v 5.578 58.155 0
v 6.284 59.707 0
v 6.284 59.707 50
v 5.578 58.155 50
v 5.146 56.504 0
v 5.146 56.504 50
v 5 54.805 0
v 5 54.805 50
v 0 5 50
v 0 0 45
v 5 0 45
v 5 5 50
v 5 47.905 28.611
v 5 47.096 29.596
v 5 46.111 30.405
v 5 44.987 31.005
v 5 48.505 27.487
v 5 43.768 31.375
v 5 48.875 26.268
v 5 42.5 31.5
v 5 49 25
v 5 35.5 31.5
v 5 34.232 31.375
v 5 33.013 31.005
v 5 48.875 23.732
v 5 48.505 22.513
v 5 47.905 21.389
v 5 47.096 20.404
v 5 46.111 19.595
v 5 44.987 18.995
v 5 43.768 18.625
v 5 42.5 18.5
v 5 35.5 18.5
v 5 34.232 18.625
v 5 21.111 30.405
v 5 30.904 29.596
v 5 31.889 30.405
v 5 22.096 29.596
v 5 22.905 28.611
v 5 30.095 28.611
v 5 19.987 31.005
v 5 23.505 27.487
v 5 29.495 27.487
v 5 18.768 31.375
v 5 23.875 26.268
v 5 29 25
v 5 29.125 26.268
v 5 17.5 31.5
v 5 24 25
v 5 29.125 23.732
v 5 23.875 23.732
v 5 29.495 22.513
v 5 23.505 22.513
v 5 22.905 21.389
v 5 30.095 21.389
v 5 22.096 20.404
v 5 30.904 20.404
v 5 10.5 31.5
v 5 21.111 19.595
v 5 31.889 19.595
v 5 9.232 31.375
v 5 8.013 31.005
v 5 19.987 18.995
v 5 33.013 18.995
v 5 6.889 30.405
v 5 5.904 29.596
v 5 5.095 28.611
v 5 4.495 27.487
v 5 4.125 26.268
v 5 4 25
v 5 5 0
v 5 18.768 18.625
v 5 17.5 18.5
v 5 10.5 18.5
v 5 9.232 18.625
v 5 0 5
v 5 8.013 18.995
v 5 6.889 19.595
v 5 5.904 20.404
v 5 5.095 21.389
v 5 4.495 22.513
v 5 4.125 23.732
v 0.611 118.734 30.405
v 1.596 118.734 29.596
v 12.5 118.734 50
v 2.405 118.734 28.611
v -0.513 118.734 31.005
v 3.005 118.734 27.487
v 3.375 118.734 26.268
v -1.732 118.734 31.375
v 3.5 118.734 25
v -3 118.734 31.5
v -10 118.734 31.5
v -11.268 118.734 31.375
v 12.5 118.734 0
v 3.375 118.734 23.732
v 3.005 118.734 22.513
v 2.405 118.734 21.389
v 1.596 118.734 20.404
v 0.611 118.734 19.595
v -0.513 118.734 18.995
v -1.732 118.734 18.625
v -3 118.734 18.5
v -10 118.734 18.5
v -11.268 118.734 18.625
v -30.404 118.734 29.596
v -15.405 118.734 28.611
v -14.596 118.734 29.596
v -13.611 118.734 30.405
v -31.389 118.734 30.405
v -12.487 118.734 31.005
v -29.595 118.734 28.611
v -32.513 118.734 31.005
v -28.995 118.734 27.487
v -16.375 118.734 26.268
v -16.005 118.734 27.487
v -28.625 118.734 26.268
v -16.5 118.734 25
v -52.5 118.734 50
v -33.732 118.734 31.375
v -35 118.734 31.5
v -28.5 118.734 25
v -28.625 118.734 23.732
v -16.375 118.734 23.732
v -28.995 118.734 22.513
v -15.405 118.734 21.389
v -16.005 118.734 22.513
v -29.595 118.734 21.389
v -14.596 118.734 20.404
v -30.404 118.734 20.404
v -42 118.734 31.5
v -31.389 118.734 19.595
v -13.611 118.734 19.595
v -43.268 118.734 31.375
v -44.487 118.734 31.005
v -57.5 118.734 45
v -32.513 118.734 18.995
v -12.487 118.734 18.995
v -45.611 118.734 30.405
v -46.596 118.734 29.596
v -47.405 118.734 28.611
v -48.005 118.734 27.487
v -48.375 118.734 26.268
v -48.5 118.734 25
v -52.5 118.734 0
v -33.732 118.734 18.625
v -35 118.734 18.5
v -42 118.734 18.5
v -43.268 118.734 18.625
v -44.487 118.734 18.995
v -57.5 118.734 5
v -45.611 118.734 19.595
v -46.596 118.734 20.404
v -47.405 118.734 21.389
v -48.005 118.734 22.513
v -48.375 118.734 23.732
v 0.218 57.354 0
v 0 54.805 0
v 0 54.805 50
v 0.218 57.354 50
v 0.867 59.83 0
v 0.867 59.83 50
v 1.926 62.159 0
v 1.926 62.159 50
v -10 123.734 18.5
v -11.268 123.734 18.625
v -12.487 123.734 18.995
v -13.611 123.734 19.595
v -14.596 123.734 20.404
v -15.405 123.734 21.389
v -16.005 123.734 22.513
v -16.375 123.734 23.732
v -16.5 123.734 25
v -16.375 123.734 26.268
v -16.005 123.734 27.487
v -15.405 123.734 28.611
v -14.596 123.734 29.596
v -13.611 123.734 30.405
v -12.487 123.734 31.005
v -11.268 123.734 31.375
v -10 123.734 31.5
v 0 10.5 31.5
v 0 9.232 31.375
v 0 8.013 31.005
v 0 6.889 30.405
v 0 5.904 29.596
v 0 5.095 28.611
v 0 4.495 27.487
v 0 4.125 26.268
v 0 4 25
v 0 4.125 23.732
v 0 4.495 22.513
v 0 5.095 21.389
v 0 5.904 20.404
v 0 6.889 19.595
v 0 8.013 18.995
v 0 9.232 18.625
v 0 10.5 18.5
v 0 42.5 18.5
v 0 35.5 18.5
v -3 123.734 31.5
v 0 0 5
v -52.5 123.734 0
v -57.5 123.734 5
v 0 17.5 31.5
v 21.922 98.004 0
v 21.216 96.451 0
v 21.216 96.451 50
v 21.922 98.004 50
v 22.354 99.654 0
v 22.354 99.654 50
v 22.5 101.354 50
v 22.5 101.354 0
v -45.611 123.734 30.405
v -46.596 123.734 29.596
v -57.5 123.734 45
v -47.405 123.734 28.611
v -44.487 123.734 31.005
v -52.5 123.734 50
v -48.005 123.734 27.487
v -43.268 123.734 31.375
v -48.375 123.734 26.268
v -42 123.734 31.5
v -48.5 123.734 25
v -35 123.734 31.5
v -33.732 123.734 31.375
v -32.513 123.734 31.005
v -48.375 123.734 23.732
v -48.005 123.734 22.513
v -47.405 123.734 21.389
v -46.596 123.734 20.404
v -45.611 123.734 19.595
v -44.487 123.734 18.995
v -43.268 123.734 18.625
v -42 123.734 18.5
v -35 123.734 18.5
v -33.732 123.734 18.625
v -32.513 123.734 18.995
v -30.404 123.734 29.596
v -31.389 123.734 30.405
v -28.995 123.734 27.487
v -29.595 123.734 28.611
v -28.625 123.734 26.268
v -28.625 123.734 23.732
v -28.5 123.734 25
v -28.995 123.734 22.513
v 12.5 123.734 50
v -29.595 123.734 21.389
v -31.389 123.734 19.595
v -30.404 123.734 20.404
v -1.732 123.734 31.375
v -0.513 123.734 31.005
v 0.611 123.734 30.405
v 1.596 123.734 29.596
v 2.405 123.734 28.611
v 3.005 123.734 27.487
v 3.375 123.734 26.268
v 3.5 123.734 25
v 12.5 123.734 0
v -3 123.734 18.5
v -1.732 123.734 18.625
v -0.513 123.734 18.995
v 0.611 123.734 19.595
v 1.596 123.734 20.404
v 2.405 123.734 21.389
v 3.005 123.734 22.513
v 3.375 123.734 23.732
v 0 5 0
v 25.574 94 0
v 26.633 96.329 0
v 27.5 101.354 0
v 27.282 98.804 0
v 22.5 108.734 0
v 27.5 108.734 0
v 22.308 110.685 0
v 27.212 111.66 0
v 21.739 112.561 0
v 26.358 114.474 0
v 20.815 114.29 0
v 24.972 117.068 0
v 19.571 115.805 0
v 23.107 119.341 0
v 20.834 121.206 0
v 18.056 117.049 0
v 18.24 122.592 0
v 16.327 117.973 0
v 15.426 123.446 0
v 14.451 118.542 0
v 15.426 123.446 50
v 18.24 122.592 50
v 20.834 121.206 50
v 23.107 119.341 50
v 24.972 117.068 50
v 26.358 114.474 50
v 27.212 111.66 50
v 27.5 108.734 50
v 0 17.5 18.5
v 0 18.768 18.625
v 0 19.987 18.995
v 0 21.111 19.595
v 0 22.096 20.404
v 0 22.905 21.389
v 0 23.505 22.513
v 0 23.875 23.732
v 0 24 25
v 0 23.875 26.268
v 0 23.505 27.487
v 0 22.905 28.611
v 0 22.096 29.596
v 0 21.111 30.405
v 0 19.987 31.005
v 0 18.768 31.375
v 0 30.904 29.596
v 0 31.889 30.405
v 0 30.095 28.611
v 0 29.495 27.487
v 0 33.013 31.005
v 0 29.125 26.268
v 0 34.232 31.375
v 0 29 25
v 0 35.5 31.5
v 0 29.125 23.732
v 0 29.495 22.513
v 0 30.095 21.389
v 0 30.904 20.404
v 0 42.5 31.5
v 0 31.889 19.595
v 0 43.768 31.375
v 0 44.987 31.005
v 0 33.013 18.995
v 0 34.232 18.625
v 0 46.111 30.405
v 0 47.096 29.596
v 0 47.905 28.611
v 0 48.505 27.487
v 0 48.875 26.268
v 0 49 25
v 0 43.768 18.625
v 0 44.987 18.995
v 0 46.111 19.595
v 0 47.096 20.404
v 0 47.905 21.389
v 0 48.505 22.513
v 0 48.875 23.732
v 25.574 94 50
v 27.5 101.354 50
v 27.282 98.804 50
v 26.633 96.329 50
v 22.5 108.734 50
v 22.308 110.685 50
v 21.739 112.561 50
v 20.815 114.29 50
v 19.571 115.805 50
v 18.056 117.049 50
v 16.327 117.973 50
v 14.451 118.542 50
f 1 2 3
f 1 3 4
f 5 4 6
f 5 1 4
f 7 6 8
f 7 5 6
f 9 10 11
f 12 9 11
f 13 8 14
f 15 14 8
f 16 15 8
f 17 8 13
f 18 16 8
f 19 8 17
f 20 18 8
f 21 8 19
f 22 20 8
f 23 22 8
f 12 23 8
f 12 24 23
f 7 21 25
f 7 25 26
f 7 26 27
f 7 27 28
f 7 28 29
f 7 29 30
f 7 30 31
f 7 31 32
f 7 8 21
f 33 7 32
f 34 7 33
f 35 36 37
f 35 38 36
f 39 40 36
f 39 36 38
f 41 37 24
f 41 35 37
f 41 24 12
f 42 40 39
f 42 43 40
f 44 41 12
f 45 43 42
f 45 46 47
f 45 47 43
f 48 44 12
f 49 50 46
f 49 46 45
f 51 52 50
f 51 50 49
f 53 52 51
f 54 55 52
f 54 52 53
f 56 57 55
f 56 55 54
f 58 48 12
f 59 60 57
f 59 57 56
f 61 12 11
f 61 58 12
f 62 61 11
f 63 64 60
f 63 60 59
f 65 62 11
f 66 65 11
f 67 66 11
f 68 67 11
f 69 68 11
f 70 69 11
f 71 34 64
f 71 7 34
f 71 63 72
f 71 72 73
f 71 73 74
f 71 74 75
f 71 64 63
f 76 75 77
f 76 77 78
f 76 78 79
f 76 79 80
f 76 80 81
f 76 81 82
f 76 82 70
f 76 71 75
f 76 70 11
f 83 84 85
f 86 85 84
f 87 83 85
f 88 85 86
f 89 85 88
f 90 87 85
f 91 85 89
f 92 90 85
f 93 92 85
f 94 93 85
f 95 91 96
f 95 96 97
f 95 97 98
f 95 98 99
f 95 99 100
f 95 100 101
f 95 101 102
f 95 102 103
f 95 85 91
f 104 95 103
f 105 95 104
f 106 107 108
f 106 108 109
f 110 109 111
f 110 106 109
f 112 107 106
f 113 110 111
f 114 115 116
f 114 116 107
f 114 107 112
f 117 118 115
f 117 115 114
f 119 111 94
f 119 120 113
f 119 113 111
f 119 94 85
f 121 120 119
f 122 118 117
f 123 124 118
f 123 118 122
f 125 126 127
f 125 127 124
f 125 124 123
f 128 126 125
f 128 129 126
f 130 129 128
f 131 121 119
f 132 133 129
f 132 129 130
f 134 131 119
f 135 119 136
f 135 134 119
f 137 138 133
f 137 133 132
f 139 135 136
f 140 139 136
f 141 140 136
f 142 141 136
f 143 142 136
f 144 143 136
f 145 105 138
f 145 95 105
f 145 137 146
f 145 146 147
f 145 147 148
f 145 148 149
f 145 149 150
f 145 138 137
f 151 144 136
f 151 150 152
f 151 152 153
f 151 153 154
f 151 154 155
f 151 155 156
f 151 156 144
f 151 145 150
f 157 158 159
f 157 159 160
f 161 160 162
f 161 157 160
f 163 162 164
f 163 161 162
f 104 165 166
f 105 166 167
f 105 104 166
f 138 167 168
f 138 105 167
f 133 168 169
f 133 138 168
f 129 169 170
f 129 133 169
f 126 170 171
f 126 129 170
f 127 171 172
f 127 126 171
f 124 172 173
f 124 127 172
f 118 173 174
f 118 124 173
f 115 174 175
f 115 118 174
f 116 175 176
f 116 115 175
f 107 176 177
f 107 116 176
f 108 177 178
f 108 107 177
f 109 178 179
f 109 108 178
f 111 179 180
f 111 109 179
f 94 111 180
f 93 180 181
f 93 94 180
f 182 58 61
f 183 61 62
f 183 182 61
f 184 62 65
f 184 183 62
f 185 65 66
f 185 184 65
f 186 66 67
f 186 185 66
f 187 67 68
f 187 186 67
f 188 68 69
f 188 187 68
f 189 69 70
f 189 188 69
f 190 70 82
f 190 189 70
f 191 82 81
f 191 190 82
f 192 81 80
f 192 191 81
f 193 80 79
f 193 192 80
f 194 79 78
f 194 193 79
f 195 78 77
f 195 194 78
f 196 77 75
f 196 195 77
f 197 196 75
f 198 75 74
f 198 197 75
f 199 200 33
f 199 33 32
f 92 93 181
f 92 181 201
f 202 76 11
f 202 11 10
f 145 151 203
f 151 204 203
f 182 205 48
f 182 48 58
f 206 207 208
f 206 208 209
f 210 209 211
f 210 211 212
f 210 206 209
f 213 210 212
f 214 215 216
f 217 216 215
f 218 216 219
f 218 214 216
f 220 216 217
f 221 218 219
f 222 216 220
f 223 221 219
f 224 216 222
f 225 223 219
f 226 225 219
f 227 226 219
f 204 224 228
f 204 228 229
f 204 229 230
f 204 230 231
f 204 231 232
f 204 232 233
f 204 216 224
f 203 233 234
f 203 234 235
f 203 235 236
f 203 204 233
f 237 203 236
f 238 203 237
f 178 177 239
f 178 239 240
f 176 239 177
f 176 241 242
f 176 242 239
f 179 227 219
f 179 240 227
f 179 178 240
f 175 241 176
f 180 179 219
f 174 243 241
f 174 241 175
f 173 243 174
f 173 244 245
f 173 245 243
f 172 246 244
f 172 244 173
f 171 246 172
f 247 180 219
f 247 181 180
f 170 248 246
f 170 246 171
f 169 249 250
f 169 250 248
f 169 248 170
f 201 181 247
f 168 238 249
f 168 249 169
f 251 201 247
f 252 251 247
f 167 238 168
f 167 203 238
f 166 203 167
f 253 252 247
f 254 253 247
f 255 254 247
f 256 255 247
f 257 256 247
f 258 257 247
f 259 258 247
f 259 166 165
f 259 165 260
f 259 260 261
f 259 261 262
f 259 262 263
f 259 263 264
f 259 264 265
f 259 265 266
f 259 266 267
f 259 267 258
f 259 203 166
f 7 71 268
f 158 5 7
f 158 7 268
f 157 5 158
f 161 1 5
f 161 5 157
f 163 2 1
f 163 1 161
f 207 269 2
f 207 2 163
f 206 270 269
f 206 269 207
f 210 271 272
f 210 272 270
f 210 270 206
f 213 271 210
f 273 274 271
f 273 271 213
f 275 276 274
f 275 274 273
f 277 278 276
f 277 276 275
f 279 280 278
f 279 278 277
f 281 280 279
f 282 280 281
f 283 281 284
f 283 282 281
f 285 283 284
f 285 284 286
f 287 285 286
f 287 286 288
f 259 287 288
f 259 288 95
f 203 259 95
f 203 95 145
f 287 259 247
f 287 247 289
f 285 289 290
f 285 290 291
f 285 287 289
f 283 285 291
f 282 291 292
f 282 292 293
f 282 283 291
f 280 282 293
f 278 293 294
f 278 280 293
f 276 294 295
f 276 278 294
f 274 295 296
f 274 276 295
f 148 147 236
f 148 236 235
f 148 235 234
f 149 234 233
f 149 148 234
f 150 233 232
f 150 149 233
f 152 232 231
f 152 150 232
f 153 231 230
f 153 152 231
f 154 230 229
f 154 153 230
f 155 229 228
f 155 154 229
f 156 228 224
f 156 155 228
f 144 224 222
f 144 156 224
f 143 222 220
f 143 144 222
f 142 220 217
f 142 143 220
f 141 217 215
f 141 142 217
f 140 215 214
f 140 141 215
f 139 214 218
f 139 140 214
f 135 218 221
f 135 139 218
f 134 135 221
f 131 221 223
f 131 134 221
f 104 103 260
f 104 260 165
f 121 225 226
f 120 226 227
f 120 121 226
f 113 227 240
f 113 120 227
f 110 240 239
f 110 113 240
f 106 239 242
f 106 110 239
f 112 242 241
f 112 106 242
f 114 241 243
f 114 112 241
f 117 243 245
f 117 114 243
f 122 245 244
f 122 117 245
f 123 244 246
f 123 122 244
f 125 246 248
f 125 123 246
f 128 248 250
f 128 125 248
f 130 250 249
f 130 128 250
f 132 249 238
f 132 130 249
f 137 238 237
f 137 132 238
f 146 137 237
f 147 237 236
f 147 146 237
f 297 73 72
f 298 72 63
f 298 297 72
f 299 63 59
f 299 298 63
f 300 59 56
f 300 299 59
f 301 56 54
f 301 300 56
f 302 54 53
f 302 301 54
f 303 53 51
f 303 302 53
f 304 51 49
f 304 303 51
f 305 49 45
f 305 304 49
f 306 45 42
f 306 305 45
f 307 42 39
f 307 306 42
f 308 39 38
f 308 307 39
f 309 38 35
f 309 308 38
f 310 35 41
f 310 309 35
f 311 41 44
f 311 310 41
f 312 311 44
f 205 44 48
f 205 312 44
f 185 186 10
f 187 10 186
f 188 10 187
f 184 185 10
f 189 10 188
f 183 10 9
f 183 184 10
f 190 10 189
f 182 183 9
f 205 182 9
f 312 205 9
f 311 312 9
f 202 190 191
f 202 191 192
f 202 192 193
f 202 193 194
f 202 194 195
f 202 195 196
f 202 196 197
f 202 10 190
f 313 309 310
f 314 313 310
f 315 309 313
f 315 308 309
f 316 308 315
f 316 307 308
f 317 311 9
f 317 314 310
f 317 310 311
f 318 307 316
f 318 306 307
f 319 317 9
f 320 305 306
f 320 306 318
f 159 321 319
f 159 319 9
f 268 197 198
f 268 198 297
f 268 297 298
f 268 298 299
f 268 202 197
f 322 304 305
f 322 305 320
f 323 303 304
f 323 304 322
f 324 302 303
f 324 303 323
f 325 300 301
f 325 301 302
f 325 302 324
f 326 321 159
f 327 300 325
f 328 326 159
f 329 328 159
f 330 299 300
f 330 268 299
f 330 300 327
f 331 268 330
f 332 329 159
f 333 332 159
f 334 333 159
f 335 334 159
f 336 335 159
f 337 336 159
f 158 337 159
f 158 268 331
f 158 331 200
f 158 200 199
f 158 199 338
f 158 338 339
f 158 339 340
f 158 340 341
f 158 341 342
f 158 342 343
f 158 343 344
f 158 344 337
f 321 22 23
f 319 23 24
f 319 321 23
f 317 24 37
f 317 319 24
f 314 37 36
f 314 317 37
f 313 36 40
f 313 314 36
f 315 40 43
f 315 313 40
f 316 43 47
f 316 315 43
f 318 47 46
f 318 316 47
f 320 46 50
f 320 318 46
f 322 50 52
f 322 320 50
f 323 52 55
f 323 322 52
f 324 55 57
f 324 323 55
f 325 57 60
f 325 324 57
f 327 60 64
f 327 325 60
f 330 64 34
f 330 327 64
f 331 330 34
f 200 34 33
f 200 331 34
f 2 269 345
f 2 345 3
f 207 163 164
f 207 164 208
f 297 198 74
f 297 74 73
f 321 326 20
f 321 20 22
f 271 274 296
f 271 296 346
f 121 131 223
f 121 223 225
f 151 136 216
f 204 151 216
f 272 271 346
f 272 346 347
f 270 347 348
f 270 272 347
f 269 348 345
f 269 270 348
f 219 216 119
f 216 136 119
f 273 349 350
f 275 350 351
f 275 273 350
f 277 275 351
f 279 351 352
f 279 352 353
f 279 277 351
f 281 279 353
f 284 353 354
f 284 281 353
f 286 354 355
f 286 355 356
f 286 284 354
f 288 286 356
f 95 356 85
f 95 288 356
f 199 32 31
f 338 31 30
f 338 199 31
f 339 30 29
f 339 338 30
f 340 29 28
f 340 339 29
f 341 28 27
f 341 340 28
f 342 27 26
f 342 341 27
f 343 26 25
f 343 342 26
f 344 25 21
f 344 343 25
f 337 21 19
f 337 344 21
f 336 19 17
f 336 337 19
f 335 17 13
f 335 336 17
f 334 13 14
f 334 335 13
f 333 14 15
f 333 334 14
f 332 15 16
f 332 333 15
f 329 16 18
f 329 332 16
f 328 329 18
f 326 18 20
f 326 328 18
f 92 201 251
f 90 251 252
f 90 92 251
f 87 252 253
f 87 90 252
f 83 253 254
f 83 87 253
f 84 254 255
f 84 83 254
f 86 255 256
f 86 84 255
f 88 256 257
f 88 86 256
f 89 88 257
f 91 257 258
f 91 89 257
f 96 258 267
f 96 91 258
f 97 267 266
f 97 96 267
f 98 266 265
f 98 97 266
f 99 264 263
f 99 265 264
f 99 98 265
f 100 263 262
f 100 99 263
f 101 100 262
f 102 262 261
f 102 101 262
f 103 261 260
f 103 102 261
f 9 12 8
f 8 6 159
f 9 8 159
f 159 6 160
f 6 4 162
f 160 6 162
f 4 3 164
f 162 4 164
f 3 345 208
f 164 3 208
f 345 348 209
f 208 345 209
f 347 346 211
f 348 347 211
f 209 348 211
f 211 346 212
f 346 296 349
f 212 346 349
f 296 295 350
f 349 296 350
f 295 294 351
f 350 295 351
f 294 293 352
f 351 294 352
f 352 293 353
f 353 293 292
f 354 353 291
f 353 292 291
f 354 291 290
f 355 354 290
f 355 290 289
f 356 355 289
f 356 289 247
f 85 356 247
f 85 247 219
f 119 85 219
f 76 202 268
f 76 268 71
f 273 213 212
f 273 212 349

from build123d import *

# Parameters (mm, degrees)
SM_BASE_FLANGE_1_DEPTH = 50
OTHER_START            = -40.658639918
OTHER_1_OUTLINE_W      = 38
OTHER_1_OUTLINE_H      = 8
OTHER_1_DEPTH          = 3.535533906
OTHER_START_2          = -76.013978978
OTHER_1_2_OUTLINE_W    = 10
OTHER_1_2_OUTLINE_H    = 8
OTHER_1_2_DEPTH        = 3.535533906
OTHER_1_3_OUTLINE_W    = 7
OTHER_1_3_OUTLINE_H    = 10
OTHER_1_3_DEPTH        = 3.535533906
OTHER_START_3          = -35.355339059
OTHER_1_4_OUTLINE_W    = 7
OTHER_1_4_OUTLINE_H    = 38
OTHER_1_4_DEPTH        = 3.535533906
CUT_EXTRUDE_3_DEPTH    = 10
CUT_EXTRUDE_4_DEPTH    = 10


# Read off the part's stored shape, not the designer's step: Затупленный угол1
# Sheet-metal steps are written as plain solids
with BuildPart() as part:
    # Sketch 1 → Базовая кромка1 (new body)
    with BuildSketch(Plane.XY):
        with BuildLine():
            Line((0, 0), (0, 54.804758849))
            ThreePointArc((0, 54.804758849), (0.489581401, 58.605778722), (1.926366943, 62.158677443))
            Line((1.926366943, 62.158677443), (21.215755371, 96.450923538))
            ThreePointArc((21.215755371, 96.450923538), (22.1736124, 98.819522686), (22.5, 101.353535934))
            Line((22.5, 101.353535934), (22.5, 108.7340251))
            ThreePointArc((22.5, 108.7340251), (19.571067812, 115.805092912), (12.5, 118.7340251))
            Line((12.5, 118.7340251), (-57.5, 118.7340251))
            Line((-57.5, 118.7340251), (-57.5, 123.7340251))
            Line((-57.5, 123.7340251), (12.5, 123.7340251))
            ThreePointArc((12.5, 123.7340251), (23.106601718, 119.340626818), (27.5, 108.7340251))
            Line((27.5, 108.7340251), (27.5, 101.353535934))
            ThreePointArc((27.5, 101.353535934), (27.010418599, 97.552516061), (25.573633057, 93.99961734))
            Line((25.573633057, 93.99961734), (6.284244629, 59.707371245))
            ThreePointArc((6.284244629, 59.707371245), (5.3263876, 57.338772097), (5, 54.804758849))
            Line((5, 54.804758849), (5, 0))
            Line((5, 0), (0, 0))
        make_face()
    extrude(amount=SM_BASE_FLANGE_1_DEPTH)

    # Other 1 outline → Other 1 (cut)
    with BuildSketch(Plane(origin=(0, 0, 0), x_dir=(0.7071067811865474, 0, -0.7071067811865477), z_dir=(0.7071067811865476, 0, 0.7071067811865476)).offset(OTHER_START)):
        with Locations((-55, 121)):
            Rectangle(OTHER_1_OUTLINE_W, OTHER_1_OUTLINE_H)
    extrude(amount=OTHER_1_DEPTH, mode=Mode.SUBTRACT)

    # Other 1 2 outline → Other 1 2 (cut)
    with BuildSketch(Plane(origin=(0, 0, 0), x_dir=(0.7071067811865474, 0, 0.7071067811865477), z_dir=(0.7071067811865476, 0, -0.7071067811865476)).offset(OTHER_START_2)):
        with Locations((-5, -121)):
            Rectangle(OTHER_1_2_OUTLINE_W, OTHER_1_2_OUTLINE_H)
    extrude(amount=OTHER_1_2_DEPTH, mode=Mode.SUBTRACT)

    # Other 1 3 outline → Other 1 3 (cut)
    with BuildSketch(Plane(origin=(0, 0, 0), x_dir=(1, 0, 0), z_dir=(0, 0.7071067811865476, 0.7071067811865476))):
        with Locations((2.5, 0)):
            Rectangle(OTHER_1_3_OUTLINE_W, OTHER_1_3_OUTLINE_H)
    extrude(amount=OTHER_1_3_DEPTH, mode=Mode.SUBTRACT)

    # Other 1 4 outline → Other 1 4 (cut)
    with BuildSketch(Plane(origin=(0, 0, 0), x_dir=(1, 0, 0), z_dir=(0, 0.7071067811865476, -0.7071067811865476)).offset(OTHER_START_3)):
        with Locations((2.5, -21)):
            Rectangle(OTHER_1_4_OUTLINE_W, OTHER_1_4_OUTLINE_H)
    extrude(amount=OTHER_1_4_DEPTH, mode=Mode.SUBTRACT)

    # Эскиз4 → Вырез-Вытянуть3 (cut)
    with BuildSketch(Plane.XZ.offset(-118.7340251)):
        with BuildLine():
            Line((-35, 18.5), (-42, 18.5))
            ThreePointArc((-42, 18.5), (-48.5, 25), (-42, 31.5))
            Line((-42, 31.5), (-35, 31.5))
            ThreePointArc((-35, 31.5), (-28.5, 25), (-35, 18.5))
        make_face()
        with BuildLine():
            Line((-3, 18.5), (-10, 18.5))
            ThreePointArc((-10, 18.5), (-16.5, 25), (-10, 31.5))
            Line((-10, 31.5), (-3, 31.5))
            ThreePointArc((-3, 31.5), (3.5, 25), (-3, 18.5))
        make_face()
    extrude(amount=-CUT_EXTRUDE_3_DEPTH, mode=Mode.SUBTRACT)

    # Эскиз5 → Вырез-Вытянуть4 (cut)
    with BuildSketch(Plane.ZY):
        with BuildLine():
            Line((18.5, 10.5), (18.5, 17.5))
            ThreePointArc((18.5, 17.5), (25, 24), (31.5, 17.5))
            Line((31.5, 17.5), (31.5, 10.5))
            ThreePointArc((31.5, 10.5), (25, 4), (18.5, 10.5))
        make_face()
        with BuildLine():
            Line((18.5, 35.5), (18.5, 42.5))
            ThreePointArc((18.5, 42.5), (25, 49), (31.5, 42.5))
            Line((31.5, 42.5), (31.5, 35.5))
            ThreePointArc((31.5, 35.5), (25, 29), (18.5, 35.5))
        make_face()
    extrude(amount=-CUT_EXTRUDE_4_DEPTH, mode=Mode.SUBTRACT)


solid = part.part
